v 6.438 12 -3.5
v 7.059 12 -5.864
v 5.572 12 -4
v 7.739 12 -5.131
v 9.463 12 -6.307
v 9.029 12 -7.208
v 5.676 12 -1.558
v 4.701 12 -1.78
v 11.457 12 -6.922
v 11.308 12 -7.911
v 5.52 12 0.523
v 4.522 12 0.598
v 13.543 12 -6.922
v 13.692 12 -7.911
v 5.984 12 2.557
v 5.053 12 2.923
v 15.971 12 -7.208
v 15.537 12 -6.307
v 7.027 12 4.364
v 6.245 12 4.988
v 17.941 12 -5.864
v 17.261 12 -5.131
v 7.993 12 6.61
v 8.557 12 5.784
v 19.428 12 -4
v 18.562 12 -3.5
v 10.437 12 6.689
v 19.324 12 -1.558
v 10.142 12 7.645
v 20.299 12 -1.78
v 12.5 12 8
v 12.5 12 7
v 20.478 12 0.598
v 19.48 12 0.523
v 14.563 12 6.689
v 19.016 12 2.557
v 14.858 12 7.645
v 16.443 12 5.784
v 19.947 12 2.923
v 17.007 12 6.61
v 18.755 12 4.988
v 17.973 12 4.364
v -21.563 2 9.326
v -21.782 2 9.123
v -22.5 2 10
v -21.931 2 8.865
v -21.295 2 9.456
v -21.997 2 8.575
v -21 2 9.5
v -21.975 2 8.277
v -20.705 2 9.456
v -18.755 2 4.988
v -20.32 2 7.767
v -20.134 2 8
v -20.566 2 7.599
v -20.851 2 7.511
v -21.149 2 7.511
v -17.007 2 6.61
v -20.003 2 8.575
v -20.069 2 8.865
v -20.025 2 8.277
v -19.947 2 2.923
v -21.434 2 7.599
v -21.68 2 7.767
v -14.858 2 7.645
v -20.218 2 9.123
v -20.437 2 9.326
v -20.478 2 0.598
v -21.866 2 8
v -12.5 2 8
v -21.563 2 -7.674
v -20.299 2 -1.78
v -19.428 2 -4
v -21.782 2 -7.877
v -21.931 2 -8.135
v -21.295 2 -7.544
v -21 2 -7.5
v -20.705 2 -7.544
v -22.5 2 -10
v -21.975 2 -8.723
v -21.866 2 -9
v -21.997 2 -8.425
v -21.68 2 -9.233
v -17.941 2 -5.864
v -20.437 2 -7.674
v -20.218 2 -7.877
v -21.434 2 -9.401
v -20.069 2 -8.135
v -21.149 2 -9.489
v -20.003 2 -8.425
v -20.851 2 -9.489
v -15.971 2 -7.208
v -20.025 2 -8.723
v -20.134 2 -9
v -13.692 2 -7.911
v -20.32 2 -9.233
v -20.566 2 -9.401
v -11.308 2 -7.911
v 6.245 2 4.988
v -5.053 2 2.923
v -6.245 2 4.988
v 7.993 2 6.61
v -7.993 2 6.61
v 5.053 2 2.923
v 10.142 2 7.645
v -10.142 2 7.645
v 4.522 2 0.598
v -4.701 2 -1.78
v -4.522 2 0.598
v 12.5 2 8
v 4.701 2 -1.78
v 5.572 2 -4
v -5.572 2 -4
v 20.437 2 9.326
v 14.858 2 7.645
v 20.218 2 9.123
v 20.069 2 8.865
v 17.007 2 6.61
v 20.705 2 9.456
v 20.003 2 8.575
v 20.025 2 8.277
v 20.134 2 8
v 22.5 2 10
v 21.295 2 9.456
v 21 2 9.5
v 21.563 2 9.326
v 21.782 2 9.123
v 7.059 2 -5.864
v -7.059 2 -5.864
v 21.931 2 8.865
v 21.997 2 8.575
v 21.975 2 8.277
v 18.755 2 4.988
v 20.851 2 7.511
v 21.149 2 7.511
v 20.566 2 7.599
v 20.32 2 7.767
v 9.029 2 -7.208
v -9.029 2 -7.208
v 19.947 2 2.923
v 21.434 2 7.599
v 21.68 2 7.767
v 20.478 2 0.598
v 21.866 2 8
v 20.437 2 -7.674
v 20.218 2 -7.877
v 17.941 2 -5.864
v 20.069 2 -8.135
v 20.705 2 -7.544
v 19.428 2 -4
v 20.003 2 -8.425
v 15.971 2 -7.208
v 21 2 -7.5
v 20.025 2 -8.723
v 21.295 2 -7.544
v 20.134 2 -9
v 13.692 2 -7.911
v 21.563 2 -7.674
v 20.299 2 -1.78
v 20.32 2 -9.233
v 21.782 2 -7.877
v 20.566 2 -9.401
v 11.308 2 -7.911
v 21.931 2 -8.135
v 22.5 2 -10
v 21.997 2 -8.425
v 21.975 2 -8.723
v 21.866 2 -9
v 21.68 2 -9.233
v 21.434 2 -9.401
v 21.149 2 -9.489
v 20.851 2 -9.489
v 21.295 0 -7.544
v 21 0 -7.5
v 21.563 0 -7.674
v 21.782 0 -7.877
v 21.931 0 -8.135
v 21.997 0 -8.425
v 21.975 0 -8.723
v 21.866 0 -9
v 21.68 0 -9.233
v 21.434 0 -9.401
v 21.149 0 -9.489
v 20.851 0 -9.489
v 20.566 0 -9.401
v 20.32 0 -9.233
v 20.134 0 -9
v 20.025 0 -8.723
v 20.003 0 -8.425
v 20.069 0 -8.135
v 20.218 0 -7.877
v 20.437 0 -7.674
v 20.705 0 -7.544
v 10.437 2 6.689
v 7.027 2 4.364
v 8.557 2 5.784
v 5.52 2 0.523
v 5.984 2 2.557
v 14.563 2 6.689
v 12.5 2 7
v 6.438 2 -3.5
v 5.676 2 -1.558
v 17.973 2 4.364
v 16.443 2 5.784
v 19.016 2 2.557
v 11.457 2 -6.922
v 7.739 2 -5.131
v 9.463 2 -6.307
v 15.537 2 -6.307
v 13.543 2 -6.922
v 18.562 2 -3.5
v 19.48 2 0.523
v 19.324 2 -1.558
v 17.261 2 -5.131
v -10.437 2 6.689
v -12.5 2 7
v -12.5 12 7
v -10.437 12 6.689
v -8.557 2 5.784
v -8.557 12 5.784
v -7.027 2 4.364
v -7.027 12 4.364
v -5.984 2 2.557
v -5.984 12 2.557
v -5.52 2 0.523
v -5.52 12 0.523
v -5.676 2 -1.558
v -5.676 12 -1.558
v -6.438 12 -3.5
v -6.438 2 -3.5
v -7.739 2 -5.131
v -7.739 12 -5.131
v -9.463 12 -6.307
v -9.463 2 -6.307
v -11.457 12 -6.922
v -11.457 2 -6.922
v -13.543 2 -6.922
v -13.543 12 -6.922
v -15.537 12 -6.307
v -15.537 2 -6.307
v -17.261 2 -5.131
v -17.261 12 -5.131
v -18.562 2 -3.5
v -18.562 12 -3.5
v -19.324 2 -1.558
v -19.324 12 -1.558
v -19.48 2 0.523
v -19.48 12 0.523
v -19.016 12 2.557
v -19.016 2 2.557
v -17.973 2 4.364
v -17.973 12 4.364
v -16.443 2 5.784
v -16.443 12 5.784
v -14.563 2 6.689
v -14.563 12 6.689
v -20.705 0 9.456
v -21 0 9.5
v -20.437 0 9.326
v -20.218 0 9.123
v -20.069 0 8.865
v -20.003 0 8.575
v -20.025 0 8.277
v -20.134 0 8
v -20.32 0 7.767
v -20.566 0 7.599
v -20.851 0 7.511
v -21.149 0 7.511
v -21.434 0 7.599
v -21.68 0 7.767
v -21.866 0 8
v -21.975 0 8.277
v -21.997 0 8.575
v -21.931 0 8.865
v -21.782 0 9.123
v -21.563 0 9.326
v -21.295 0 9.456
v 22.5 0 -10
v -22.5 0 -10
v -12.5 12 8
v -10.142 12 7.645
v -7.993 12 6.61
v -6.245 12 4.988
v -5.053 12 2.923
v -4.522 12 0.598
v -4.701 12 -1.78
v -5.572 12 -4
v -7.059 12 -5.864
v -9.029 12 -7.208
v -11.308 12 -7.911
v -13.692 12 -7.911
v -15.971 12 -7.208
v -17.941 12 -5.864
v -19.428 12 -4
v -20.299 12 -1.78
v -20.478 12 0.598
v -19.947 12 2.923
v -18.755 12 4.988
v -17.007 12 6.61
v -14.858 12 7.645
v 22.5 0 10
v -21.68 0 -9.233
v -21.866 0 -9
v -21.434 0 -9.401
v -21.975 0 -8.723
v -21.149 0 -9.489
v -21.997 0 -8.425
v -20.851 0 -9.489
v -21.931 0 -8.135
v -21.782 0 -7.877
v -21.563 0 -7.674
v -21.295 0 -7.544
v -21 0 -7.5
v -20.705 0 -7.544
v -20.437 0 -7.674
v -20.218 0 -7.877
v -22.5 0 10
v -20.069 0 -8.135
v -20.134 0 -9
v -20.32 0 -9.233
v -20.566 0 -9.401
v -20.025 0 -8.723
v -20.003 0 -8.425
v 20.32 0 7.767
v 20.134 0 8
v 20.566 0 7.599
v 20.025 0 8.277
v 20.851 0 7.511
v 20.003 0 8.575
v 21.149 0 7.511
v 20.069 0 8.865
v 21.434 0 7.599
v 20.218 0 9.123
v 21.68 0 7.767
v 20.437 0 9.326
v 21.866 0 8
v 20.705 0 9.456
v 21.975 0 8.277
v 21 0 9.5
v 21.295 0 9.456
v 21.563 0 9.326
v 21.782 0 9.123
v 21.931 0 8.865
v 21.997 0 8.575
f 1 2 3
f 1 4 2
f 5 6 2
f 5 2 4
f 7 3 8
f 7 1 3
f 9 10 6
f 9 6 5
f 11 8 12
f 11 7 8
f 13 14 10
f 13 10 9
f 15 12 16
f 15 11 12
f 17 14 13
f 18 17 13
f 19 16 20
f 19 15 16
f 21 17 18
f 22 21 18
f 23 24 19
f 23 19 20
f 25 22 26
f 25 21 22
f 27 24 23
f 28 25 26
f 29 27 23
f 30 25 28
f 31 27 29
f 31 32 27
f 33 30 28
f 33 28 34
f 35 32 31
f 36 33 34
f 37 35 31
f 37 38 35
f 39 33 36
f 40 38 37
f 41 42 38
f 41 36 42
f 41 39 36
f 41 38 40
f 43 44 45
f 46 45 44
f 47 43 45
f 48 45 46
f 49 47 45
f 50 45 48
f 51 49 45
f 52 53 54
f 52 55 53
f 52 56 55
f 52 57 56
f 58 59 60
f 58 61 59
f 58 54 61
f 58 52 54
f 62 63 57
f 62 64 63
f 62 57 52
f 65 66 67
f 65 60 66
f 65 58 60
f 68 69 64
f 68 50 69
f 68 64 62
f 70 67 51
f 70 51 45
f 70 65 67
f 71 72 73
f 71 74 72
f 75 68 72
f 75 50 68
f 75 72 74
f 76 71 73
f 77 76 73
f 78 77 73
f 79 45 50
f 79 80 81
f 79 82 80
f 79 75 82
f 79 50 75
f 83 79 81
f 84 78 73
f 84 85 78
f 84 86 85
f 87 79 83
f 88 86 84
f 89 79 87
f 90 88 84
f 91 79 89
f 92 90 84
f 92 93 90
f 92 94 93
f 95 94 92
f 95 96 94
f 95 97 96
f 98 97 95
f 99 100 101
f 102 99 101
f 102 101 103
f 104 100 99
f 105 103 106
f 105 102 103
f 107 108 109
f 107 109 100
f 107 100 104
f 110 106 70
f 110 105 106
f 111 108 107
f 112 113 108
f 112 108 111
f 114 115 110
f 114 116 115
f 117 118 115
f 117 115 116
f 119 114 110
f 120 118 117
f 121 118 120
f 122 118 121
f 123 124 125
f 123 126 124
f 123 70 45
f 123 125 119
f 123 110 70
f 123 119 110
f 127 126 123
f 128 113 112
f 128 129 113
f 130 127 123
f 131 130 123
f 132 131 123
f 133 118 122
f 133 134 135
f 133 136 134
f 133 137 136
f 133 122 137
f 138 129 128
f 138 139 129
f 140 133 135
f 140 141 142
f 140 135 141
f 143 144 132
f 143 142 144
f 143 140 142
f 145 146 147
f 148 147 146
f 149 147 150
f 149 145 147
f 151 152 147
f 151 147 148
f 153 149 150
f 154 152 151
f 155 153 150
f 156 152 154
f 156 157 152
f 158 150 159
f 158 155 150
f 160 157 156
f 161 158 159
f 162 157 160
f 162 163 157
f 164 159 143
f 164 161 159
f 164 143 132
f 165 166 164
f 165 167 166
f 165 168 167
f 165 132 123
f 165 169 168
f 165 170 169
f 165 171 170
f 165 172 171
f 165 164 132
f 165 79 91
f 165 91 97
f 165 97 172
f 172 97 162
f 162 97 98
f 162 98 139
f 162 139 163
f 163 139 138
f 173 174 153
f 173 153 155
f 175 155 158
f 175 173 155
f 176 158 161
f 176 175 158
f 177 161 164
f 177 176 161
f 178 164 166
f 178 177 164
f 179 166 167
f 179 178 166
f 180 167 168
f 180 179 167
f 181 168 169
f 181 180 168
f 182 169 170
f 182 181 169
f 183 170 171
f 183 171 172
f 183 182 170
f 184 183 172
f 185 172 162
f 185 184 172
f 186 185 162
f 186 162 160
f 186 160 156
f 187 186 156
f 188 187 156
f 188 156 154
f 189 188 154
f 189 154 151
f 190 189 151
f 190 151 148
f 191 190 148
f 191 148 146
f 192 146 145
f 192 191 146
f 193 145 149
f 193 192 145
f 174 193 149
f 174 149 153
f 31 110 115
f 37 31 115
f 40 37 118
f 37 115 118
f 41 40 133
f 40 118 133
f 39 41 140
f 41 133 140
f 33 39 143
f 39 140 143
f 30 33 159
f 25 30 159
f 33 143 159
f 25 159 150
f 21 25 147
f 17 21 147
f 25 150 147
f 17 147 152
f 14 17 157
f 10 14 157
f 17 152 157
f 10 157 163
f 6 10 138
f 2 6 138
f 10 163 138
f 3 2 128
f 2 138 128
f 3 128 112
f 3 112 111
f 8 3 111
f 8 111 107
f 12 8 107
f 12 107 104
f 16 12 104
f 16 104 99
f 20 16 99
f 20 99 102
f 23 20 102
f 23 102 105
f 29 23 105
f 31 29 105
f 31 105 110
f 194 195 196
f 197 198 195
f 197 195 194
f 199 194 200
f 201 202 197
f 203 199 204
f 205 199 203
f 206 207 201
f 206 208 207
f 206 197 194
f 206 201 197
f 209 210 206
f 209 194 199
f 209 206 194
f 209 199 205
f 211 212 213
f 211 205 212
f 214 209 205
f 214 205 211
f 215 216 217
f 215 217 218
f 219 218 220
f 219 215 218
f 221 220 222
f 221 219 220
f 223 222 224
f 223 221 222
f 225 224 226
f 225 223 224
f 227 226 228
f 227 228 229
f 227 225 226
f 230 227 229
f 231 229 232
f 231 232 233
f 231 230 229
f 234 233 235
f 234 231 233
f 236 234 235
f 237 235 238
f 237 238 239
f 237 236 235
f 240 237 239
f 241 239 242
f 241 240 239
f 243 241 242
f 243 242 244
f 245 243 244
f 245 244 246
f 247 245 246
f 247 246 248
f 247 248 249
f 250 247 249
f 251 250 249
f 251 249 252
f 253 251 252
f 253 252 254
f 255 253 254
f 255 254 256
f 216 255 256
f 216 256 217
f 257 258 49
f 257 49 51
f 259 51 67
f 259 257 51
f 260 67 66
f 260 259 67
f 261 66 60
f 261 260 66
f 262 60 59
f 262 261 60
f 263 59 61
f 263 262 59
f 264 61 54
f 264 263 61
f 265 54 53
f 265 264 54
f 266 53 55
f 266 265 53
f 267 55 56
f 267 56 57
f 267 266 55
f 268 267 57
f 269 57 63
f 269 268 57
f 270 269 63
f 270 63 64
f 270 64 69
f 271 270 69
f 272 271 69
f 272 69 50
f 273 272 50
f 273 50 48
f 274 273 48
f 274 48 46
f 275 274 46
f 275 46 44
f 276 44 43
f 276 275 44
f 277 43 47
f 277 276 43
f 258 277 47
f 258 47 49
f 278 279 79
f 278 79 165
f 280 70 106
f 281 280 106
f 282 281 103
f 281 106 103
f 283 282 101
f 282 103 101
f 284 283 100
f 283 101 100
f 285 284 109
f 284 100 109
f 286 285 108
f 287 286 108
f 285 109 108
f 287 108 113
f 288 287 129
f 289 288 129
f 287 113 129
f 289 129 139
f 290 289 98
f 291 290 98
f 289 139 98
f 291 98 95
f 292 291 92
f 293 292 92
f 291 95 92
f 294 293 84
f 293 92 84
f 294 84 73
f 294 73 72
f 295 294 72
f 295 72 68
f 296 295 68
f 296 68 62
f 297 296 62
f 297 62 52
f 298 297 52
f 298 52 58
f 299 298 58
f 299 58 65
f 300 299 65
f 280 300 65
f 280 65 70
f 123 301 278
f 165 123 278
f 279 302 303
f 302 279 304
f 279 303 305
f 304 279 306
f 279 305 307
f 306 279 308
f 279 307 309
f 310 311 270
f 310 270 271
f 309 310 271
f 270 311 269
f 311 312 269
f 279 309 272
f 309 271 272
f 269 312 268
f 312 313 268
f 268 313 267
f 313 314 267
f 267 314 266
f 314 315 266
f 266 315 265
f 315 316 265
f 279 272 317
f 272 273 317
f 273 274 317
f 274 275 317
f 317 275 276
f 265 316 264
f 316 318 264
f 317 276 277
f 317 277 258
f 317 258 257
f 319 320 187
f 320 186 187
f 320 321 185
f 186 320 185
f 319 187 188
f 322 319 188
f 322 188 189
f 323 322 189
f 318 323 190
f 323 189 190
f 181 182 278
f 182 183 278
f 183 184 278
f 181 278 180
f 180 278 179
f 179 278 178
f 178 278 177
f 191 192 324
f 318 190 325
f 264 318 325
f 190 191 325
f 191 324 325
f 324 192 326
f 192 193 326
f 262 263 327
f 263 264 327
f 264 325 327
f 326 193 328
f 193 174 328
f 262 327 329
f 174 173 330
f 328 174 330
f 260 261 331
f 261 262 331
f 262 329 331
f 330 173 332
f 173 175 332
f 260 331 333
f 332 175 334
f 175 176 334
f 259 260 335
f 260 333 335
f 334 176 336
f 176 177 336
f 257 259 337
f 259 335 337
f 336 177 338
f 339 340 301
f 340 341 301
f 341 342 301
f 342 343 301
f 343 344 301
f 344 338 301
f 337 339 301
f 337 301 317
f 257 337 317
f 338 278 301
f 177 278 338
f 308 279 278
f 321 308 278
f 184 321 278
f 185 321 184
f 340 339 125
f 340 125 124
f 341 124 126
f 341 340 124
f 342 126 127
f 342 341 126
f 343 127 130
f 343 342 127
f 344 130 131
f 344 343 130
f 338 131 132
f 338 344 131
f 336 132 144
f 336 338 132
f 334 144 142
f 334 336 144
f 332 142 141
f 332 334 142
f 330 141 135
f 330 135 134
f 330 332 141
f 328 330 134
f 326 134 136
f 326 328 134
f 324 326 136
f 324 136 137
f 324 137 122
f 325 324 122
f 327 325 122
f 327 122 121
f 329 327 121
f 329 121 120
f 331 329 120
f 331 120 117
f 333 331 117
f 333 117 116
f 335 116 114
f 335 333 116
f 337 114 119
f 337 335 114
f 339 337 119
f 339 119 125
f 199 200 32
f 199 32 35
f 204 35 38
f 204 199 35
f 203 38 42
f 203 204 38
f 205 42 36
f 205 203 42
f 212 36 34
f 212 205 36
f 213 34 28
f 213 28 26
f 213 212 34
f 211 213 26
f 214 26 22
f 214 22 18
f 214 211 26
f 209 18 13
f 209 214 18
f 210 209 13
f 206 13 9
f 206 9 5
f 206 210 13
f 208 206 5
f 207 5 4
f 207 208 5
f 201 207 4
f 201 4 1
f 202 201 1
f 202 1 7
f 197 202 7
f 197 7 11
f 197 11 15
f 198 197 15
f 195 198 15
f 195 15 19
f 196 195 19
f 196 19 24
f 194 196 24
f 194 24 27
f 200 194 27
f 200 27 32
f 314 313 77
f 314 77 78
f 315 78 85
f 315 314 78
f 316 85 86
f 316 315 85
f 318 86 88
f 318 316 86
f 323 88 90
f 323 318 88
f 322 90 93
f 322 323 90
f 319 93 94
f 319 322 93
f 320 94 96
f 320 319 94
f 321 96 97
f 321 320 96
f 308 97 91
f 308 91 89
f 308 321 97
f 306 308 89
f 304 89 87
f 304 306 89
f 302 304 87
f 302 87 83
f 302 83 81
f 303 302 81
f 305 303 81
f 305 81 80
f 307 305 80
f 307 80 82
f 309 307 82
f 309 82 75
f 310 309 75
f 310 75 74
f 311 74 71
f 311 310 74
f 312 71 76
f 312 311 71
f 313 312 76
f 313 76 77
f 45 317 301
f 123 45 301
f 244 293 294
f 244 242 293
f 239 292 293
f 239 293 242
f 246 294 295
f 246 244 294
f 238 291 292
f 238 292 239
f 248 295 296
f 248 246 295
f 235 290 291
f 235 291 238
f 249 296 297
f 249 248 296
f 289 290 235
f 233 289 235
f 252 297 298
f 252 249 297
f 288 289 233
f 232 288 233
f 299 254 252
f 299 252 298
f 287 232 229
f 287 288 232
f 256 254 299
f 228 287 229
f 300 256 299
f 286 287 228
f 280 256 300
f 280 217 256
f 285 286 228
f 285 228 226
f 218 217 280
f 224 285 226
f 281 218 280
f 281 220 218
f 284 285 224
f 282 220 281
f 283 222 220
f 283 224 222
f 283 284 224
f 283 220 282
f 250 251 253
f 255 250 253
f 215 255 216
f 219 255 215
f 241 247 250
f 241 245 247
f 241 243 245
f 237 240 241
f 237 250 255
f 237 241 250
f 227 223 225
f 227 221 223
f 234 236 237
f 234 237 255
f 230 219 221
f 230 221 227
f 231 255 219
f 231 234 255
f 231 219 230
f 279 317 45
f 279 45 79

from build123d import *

# Parameters (mm, degrees)
SKETCH1_W           = 45
SKETCH1_H           = 20
SKETCH1_R           = 1
SKETCH1_R_2         = 8
SKETCH1_R_3         = 7
BOSS_EXTRUDE1_DEPTH = 2
SKETCH2_R           = 8
SKETCH2_R_2         = 7
BOSS_EXTRUDE2_DEPTH = 12


with BuildPart() as part:
    # Sketch1 → Boss-Extrude1 (new body)
    with BuildSketch(Plane(origin=(0, 0, 0), x_dir=(1, 0, 0), z_dir=(0, 1, 0))):
        Rectangle(SKETCH1_W, SKETCH1_H)
        with Locations(Location((-21, -8.5, 0), (0, 0, 270))):
            Circle(SKETCH1_R, mode=Mode.SUBTRACT)
        with Locations(Location((-21, 8.5, 0), (0, 0, 270))):
            Circle(SKETCH1_R, mode=Mode.SUBTRACT)
        with Locations((-12.5, 0)):
            Circle(SKETCH1_R_2, mode=Mode.SUBTRACT)
        with Locations(Location((21, -8.5, 0), (0, 0, 270))):
            Circle(SKETCH1_R, mode=Mode.SUBTRACT)
        with Locations(Location((21, 8.5, 0), (0, 0, 270))):
            Circle(SKETCH1_R, mode=Mode.SUBTRACT)
        with Locations((12.5, 0)):
            Circle(SKETCH1_R_2, mode=Mode.SUBTRACT)
        with Locations((-12.5, 0)):
            Circle(SKETCH1_R_2)
        with Locations((-12.5, 0)):
            Circle(SKETCH1_R_3, mode=Mode.SUBTRACT)
        with Locations((-12.5, 0)):
            Circle(SKETCH1_R_3)
        with Locations((12.5, 0)):
            Circle(SKETCH1_R_2)
        with Locations((12.5, 0)):
            Circle(SKETCH1_R_3, mode=Mode.SUBTRACT)
        with Locations((12.5, 0)):
            Circle(SKETCH1_R_3)
    extrude(amount=BOSS_EXTRUDE1_DEPTH)

    # Sketch2 → Boss-Extrude2 (add)
    with BuildSketch(Plane(origin=(0, 0, 0), x_dir=(1, 0, 0), z_dir=(0, 1, 0))):
        with Locations(Location((-12.5, 0, 0), (0, 0, 270))):
            Circle(SKETCH2_R)
        with Locations(Location((-12.5, 0, 0), (0, 0, 270))):
            Circle(SKETCH2_R_2, mode=Mode.SUBTRACT)
        with Locations(Location((12.5, 0, 0), (0, 0, 270))):
            Circle(SKETCH2_R)
        with Locations(Location((12.5, 0, 0), (0, 0, 270))):
            Circle(SKETCH2_R_2, mode=Mode.SUBTRACT)
    extrude(amount=BOSS_EXTRUDE2_DEPTH)


solid = part.part
